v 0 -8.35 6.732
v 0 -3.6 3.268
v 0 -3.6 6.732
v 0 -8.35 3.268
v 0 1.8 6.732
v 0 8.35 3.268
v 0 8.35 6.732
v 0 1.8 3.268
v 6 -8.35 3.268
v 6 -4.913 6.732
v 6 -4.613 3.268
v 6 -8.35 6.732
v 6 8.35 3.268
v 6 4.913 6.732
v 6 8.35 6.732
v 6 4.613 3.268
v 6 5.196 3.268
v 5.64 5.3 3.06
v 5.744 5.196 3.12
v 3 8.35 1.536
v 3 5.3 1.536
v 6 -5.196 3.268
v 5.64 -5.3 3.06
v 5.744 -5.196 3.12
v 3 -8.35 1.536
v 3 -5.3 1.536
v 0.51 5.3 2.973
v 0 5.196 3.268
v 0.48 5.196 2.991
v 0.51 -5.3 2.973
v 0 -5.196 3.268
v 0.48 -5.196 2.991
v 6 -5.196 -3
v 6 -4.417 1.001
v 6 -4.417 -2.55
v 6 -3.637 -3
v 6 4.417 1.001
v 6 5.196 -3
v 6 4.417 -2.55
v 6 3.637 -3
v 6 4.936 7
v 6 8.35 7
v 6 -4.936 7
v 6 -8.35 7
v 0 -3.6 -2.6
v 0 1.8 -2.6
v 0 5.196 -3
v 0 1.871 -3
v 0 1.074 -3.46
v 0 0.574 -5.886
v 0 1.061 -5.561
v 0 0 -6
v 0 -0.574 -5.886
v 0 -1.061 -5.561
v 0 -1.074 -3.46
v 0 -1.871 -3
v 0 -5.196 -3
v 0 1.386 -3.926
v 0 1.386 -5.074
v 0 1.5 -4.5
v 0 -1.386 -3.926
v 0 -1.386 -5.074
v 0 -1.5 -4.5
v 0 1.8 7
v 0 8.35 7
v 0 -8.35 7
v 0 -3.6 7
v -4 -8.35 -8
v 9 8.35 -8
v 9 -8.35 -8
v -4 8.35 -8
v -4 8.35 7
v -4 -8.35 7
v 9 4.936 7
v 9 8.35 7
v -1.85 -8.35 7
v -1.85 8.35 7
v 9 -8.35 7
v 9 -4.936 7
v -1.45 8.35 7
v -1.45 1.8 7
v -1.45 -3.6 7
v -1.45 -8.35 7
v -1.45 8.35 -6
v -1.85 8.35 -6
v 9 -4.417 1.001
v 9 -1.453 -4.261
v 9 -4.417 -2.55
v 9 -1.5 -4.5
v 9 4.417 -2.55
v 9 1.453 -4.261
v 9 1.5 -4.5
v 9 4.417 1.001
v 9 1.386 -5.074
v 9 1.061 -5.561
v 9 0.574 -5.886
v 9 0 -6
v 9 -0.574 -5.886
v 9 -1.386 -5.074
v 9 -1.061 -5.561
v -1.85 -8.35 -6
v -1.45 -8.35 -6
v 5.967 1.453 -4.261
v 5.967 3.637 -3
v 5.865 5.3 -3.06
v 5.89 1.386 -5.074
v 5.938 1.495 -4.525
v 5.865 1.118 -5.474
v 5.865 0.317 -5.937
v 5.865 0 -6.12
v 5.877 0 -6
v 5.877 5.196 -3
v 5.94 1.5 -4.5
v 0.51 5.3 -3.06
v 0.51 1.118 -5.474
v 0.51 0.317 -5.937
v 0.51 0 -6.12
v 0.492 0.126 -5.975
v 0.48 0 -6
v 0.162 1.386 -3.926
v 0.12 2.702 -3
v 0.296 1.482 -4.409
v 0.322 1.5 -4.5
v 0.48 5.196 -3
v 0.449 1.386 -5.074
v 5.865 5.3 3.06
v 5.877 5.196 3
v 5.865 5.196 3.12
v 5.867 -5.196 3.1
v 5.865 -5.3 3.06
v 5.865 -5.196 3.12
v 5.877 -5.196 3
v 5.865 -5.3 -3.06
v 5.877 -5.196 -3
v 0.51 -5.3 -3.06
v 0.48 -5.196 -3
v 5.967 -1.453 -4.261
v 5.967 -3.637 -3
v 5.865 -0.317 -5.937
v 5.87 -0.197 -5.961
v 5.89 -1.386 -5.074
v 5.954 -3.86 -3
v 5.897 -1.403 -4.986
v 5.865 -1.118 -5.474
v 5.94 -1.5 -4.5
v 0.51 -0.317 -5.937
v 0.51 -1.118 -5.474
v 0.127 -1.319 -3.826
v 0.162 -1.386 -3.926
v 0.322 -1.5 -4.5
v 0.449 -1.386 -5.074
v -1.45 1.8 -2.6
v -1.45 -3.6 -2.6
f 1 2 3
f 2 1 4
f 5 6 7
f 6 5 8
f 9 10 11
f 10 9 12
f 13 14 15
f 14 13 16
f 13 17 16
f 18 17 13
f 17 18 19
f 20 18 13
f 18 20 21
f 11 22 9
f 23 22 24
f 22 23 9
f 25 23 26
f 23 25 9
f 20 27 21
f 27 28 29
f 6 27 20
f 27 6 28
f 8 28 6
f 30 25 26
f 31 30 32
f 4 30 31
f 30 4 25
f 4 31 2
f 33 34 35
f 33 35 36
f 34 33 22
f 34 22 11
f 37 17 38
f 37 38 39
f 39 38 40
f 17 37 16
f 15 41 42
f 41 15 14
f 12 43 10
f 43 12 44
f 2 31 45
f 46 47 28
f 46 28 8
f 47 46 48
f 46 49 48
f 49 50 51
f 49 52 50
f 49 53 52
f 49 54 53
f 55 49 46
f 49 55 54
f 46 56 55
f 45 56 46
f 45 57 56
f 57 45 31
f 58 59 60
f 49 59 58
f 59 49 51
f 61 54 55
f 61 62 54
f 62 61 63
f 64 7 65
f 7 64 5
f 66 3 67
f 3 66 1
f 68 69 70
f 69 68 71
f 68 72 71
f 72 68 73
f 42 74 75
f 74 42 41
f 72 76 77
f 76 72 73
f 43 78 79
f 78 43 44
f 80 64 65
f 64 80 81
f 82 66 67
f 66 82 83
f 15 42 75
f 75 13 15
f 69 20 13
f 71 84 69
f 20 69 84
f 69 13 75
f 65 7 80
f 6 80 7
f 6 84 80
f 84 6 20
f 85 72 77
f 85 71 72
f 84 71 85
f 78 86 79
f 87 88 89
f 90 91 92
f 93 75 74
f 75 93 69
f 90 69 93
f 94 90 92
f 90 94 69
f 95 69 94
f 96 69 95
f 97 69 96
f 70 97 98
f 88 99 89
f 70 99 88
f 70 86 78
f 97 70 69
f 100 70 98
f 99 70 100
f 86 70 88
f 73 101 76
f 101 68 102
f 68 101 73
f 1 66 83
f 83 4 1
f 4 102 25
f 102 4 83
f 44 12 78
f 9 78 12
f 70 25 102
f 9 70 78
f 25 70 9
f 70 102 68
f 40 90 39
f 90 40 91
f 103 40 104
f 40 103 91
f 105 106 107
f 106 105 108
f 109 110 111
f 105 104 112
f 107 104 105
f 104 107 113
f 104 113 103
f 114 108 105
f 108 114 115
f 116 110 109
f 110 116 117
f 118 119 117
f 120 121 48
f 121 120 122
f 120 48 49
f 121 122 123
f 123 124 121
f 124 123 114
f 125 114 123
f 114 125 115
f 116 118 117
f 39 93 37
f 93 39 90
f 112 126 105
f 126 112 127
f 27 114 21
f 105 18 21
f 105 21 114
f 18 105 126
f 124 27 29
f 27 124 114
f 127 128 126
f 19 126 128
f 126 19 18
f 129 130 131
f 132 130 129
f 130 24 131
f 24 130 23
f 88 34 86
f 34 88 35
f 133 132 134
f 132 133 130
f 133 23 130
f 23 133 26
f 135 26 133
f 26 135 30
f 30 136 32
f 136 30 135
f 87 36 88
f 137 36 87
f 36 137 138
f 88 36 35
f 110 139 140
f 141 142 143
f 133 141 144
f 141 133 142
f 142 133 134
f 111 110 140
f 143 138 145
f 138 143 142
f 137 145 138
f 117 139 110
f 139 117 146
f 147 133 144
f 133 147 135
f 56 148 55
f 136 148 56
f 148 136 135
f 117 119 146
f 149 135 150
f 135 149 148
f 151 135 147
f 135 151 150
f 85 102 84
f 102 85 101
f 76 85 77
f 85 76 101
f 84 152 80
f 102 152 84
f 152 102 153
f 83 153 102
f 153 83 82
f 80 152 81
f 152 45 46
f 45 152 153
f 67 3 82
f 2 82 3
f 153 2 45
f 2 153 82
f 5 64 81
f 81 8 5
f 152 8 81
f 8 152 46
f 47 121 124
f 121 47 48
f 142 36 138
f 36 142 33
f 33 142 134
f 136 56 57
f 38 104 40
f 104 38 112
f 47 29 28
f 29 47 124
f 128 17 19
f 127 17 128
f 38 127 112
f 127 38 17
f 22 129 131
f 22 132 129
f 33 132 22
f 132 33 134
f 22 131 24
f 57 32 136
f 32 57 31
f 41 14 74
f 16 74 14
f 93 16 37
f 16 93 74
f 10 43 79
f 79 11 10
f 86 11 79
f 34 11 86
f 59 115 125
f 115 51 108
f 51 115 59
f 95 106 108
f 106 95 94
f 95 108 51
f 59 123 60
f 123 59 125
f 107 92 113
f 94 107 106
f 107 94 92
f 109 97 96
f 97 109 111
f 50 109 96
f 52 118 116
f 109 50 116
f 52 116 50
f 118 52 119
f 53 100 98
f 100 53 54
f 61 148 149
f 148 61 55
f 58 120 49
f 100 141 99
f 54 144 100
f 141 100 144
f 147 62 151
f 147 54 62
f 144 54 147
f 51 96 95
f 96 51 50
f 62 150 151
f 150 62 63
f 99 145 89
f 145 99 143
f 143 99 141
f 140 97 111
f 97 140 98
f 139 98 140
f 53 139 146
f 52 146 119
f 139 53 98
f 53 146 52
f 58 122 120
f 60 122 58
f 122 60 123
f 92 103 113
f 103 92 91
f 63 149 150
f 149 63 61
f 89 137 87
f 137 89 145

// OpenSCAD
// file: Lights4b.scad
// Lights4b
// Ferrules for 3 mm fiber optic sideglows

//p1=[ [0,0], [0,4], [0.5,5], [5.75,5], [5.85,4], [9.15,4], [9.25,5], [12,5], [27,3], [27,0] ];
p1=[ [0,0], [0,4], [0.5,6], [5.75,6], [5.85,5], [9.15,5], [9.25,6], [12,6], [27,3], [27,0] ];

module Ferrule1(){

difference(){
    rotate([0,-90,0])
    rotate_extrude($fn=6){
        rotate([0,0,-90])
        polygon(points=p1);
    }    
    
    color("cyan")
    rotate([0,90,0])
//    cylinder(r1=2.0,r2=1.8, h=50,$fn=6);
    cylinder(r1=1.9,r2=1.9, h=50,$fn=6);
}

}

//---------------------------------------------
// make a solid body version, ie no cut for the fiber
module Ferrule2(){

//difference(){
rotate([0,-90,0])
rotate_extrude($fn=6){
    rotate([0,0,-90])
    polygon(points=p1);
}    

}

//--------------------------------------------------------
// make a solid body version, scale the polygon, use this for making
// cuts into the Rx
module Ferrule3(){

rotate([0,-90,0])
rotate_extrude($fn=6){
    rotate([0,0,-90])
    scale(1.02)
    polygon(points=p1);
}    

}
//--------------------------------------------------------
// make a solid body version, scale the polygon, use this for making
// cuts into the Rx
module Ferrule4(){

intersection(){
rotate([0,-90,0])
rotate_extrude($fn=6){
    rotate([0,0,-90])
    scale(1.02)
    polygon(points=p1);
}    
translate([8,-20,-10]) linear_extrude(height=20) square(40);
}

}

//============================


Ferrule1();


//translate([0,0,-13]) Ferrule4();

/*
color("cyan")
translate([-1,0,0])
rotate([0,90,0])
cylinder(r=1.5,h=40,$fn=30);

color("orange")
translate([0,0,13])
Ferrule2();

color("red")
translate([0,0,2*13])
Ferrule3();

color("pink")
intersection(){
    translate([0,0,3*13])
    difference(){
        Ferrule3();
        Ferrule2();
    }
    translate([-35,0,0])
    linear_extrude(heigth=100)
    square(100,center=true);
}

*/
// main file
// Lights4a
// headblock for leds, fibers insert with ferrules Lights4b part
use <Lights4b.scad>

module Rx1(){
tol=0.20;
Off1 = 1.0;



difference(){
// Rx body
translate([-4,-8.35,-8]) color("cyan")
linear_extrude(height=15) square(size=[13,16.7]);

Ferrule3();


//==========
// led tape and chip
translate([-1.85,-20,-6])
//linear_extrude(height=12) square(size=[0.2+tol,40]);
linear_extrude(height=16) square(size=[0.2+tol,40]);
translate([-1.65,-2.5-tol/2-Off1,-2.5-tol/2])
linear_extrude(height=5+tol) square(size=[1.65+tol,5+tol]);


//-------
// cut for the chip head
color("red")
translate([-1.65,-2.5-tol/2-Off1,-2.5-tol/2])
linear_extrude(height=12) 
    square(size=[1.65+tol*2,5+tol*2]);


// cut for the ferrule head
translate([3,0,-3]) color("pink")
linear_extrude(height=12) square(size=[6,12*0.866],center=true);



// cut for the ferrule neck
translate([7,0,0]) color("green")
linear_extrude(height=10,scale=1.2) square(size=[6,8.66],center=true);

// cut for extra clearance at the bottom of the well
translate([0,0,-4.5]) color("orange")
rotate([0,90,0]) 
cylinder(r=1.5,h=12,$fn=16);

// material reduction on sidewalls
// possible locking mechanism?
translate([3,-20,5.0]) color("gray") rotate([-90,-90,0]){
cylinder(r=3.0/0.866,h=40,$fn=6);
    translate([3,0,0])
    linear_extrude(height=40) square(6,center=true);
}


}  // end of difference

} // end of module

//==================================

Rx1();

/*

for(i=[0:0]){
    translate([0,16.7*i,0]) Rx1();
}
*/
//Ferrule1();
